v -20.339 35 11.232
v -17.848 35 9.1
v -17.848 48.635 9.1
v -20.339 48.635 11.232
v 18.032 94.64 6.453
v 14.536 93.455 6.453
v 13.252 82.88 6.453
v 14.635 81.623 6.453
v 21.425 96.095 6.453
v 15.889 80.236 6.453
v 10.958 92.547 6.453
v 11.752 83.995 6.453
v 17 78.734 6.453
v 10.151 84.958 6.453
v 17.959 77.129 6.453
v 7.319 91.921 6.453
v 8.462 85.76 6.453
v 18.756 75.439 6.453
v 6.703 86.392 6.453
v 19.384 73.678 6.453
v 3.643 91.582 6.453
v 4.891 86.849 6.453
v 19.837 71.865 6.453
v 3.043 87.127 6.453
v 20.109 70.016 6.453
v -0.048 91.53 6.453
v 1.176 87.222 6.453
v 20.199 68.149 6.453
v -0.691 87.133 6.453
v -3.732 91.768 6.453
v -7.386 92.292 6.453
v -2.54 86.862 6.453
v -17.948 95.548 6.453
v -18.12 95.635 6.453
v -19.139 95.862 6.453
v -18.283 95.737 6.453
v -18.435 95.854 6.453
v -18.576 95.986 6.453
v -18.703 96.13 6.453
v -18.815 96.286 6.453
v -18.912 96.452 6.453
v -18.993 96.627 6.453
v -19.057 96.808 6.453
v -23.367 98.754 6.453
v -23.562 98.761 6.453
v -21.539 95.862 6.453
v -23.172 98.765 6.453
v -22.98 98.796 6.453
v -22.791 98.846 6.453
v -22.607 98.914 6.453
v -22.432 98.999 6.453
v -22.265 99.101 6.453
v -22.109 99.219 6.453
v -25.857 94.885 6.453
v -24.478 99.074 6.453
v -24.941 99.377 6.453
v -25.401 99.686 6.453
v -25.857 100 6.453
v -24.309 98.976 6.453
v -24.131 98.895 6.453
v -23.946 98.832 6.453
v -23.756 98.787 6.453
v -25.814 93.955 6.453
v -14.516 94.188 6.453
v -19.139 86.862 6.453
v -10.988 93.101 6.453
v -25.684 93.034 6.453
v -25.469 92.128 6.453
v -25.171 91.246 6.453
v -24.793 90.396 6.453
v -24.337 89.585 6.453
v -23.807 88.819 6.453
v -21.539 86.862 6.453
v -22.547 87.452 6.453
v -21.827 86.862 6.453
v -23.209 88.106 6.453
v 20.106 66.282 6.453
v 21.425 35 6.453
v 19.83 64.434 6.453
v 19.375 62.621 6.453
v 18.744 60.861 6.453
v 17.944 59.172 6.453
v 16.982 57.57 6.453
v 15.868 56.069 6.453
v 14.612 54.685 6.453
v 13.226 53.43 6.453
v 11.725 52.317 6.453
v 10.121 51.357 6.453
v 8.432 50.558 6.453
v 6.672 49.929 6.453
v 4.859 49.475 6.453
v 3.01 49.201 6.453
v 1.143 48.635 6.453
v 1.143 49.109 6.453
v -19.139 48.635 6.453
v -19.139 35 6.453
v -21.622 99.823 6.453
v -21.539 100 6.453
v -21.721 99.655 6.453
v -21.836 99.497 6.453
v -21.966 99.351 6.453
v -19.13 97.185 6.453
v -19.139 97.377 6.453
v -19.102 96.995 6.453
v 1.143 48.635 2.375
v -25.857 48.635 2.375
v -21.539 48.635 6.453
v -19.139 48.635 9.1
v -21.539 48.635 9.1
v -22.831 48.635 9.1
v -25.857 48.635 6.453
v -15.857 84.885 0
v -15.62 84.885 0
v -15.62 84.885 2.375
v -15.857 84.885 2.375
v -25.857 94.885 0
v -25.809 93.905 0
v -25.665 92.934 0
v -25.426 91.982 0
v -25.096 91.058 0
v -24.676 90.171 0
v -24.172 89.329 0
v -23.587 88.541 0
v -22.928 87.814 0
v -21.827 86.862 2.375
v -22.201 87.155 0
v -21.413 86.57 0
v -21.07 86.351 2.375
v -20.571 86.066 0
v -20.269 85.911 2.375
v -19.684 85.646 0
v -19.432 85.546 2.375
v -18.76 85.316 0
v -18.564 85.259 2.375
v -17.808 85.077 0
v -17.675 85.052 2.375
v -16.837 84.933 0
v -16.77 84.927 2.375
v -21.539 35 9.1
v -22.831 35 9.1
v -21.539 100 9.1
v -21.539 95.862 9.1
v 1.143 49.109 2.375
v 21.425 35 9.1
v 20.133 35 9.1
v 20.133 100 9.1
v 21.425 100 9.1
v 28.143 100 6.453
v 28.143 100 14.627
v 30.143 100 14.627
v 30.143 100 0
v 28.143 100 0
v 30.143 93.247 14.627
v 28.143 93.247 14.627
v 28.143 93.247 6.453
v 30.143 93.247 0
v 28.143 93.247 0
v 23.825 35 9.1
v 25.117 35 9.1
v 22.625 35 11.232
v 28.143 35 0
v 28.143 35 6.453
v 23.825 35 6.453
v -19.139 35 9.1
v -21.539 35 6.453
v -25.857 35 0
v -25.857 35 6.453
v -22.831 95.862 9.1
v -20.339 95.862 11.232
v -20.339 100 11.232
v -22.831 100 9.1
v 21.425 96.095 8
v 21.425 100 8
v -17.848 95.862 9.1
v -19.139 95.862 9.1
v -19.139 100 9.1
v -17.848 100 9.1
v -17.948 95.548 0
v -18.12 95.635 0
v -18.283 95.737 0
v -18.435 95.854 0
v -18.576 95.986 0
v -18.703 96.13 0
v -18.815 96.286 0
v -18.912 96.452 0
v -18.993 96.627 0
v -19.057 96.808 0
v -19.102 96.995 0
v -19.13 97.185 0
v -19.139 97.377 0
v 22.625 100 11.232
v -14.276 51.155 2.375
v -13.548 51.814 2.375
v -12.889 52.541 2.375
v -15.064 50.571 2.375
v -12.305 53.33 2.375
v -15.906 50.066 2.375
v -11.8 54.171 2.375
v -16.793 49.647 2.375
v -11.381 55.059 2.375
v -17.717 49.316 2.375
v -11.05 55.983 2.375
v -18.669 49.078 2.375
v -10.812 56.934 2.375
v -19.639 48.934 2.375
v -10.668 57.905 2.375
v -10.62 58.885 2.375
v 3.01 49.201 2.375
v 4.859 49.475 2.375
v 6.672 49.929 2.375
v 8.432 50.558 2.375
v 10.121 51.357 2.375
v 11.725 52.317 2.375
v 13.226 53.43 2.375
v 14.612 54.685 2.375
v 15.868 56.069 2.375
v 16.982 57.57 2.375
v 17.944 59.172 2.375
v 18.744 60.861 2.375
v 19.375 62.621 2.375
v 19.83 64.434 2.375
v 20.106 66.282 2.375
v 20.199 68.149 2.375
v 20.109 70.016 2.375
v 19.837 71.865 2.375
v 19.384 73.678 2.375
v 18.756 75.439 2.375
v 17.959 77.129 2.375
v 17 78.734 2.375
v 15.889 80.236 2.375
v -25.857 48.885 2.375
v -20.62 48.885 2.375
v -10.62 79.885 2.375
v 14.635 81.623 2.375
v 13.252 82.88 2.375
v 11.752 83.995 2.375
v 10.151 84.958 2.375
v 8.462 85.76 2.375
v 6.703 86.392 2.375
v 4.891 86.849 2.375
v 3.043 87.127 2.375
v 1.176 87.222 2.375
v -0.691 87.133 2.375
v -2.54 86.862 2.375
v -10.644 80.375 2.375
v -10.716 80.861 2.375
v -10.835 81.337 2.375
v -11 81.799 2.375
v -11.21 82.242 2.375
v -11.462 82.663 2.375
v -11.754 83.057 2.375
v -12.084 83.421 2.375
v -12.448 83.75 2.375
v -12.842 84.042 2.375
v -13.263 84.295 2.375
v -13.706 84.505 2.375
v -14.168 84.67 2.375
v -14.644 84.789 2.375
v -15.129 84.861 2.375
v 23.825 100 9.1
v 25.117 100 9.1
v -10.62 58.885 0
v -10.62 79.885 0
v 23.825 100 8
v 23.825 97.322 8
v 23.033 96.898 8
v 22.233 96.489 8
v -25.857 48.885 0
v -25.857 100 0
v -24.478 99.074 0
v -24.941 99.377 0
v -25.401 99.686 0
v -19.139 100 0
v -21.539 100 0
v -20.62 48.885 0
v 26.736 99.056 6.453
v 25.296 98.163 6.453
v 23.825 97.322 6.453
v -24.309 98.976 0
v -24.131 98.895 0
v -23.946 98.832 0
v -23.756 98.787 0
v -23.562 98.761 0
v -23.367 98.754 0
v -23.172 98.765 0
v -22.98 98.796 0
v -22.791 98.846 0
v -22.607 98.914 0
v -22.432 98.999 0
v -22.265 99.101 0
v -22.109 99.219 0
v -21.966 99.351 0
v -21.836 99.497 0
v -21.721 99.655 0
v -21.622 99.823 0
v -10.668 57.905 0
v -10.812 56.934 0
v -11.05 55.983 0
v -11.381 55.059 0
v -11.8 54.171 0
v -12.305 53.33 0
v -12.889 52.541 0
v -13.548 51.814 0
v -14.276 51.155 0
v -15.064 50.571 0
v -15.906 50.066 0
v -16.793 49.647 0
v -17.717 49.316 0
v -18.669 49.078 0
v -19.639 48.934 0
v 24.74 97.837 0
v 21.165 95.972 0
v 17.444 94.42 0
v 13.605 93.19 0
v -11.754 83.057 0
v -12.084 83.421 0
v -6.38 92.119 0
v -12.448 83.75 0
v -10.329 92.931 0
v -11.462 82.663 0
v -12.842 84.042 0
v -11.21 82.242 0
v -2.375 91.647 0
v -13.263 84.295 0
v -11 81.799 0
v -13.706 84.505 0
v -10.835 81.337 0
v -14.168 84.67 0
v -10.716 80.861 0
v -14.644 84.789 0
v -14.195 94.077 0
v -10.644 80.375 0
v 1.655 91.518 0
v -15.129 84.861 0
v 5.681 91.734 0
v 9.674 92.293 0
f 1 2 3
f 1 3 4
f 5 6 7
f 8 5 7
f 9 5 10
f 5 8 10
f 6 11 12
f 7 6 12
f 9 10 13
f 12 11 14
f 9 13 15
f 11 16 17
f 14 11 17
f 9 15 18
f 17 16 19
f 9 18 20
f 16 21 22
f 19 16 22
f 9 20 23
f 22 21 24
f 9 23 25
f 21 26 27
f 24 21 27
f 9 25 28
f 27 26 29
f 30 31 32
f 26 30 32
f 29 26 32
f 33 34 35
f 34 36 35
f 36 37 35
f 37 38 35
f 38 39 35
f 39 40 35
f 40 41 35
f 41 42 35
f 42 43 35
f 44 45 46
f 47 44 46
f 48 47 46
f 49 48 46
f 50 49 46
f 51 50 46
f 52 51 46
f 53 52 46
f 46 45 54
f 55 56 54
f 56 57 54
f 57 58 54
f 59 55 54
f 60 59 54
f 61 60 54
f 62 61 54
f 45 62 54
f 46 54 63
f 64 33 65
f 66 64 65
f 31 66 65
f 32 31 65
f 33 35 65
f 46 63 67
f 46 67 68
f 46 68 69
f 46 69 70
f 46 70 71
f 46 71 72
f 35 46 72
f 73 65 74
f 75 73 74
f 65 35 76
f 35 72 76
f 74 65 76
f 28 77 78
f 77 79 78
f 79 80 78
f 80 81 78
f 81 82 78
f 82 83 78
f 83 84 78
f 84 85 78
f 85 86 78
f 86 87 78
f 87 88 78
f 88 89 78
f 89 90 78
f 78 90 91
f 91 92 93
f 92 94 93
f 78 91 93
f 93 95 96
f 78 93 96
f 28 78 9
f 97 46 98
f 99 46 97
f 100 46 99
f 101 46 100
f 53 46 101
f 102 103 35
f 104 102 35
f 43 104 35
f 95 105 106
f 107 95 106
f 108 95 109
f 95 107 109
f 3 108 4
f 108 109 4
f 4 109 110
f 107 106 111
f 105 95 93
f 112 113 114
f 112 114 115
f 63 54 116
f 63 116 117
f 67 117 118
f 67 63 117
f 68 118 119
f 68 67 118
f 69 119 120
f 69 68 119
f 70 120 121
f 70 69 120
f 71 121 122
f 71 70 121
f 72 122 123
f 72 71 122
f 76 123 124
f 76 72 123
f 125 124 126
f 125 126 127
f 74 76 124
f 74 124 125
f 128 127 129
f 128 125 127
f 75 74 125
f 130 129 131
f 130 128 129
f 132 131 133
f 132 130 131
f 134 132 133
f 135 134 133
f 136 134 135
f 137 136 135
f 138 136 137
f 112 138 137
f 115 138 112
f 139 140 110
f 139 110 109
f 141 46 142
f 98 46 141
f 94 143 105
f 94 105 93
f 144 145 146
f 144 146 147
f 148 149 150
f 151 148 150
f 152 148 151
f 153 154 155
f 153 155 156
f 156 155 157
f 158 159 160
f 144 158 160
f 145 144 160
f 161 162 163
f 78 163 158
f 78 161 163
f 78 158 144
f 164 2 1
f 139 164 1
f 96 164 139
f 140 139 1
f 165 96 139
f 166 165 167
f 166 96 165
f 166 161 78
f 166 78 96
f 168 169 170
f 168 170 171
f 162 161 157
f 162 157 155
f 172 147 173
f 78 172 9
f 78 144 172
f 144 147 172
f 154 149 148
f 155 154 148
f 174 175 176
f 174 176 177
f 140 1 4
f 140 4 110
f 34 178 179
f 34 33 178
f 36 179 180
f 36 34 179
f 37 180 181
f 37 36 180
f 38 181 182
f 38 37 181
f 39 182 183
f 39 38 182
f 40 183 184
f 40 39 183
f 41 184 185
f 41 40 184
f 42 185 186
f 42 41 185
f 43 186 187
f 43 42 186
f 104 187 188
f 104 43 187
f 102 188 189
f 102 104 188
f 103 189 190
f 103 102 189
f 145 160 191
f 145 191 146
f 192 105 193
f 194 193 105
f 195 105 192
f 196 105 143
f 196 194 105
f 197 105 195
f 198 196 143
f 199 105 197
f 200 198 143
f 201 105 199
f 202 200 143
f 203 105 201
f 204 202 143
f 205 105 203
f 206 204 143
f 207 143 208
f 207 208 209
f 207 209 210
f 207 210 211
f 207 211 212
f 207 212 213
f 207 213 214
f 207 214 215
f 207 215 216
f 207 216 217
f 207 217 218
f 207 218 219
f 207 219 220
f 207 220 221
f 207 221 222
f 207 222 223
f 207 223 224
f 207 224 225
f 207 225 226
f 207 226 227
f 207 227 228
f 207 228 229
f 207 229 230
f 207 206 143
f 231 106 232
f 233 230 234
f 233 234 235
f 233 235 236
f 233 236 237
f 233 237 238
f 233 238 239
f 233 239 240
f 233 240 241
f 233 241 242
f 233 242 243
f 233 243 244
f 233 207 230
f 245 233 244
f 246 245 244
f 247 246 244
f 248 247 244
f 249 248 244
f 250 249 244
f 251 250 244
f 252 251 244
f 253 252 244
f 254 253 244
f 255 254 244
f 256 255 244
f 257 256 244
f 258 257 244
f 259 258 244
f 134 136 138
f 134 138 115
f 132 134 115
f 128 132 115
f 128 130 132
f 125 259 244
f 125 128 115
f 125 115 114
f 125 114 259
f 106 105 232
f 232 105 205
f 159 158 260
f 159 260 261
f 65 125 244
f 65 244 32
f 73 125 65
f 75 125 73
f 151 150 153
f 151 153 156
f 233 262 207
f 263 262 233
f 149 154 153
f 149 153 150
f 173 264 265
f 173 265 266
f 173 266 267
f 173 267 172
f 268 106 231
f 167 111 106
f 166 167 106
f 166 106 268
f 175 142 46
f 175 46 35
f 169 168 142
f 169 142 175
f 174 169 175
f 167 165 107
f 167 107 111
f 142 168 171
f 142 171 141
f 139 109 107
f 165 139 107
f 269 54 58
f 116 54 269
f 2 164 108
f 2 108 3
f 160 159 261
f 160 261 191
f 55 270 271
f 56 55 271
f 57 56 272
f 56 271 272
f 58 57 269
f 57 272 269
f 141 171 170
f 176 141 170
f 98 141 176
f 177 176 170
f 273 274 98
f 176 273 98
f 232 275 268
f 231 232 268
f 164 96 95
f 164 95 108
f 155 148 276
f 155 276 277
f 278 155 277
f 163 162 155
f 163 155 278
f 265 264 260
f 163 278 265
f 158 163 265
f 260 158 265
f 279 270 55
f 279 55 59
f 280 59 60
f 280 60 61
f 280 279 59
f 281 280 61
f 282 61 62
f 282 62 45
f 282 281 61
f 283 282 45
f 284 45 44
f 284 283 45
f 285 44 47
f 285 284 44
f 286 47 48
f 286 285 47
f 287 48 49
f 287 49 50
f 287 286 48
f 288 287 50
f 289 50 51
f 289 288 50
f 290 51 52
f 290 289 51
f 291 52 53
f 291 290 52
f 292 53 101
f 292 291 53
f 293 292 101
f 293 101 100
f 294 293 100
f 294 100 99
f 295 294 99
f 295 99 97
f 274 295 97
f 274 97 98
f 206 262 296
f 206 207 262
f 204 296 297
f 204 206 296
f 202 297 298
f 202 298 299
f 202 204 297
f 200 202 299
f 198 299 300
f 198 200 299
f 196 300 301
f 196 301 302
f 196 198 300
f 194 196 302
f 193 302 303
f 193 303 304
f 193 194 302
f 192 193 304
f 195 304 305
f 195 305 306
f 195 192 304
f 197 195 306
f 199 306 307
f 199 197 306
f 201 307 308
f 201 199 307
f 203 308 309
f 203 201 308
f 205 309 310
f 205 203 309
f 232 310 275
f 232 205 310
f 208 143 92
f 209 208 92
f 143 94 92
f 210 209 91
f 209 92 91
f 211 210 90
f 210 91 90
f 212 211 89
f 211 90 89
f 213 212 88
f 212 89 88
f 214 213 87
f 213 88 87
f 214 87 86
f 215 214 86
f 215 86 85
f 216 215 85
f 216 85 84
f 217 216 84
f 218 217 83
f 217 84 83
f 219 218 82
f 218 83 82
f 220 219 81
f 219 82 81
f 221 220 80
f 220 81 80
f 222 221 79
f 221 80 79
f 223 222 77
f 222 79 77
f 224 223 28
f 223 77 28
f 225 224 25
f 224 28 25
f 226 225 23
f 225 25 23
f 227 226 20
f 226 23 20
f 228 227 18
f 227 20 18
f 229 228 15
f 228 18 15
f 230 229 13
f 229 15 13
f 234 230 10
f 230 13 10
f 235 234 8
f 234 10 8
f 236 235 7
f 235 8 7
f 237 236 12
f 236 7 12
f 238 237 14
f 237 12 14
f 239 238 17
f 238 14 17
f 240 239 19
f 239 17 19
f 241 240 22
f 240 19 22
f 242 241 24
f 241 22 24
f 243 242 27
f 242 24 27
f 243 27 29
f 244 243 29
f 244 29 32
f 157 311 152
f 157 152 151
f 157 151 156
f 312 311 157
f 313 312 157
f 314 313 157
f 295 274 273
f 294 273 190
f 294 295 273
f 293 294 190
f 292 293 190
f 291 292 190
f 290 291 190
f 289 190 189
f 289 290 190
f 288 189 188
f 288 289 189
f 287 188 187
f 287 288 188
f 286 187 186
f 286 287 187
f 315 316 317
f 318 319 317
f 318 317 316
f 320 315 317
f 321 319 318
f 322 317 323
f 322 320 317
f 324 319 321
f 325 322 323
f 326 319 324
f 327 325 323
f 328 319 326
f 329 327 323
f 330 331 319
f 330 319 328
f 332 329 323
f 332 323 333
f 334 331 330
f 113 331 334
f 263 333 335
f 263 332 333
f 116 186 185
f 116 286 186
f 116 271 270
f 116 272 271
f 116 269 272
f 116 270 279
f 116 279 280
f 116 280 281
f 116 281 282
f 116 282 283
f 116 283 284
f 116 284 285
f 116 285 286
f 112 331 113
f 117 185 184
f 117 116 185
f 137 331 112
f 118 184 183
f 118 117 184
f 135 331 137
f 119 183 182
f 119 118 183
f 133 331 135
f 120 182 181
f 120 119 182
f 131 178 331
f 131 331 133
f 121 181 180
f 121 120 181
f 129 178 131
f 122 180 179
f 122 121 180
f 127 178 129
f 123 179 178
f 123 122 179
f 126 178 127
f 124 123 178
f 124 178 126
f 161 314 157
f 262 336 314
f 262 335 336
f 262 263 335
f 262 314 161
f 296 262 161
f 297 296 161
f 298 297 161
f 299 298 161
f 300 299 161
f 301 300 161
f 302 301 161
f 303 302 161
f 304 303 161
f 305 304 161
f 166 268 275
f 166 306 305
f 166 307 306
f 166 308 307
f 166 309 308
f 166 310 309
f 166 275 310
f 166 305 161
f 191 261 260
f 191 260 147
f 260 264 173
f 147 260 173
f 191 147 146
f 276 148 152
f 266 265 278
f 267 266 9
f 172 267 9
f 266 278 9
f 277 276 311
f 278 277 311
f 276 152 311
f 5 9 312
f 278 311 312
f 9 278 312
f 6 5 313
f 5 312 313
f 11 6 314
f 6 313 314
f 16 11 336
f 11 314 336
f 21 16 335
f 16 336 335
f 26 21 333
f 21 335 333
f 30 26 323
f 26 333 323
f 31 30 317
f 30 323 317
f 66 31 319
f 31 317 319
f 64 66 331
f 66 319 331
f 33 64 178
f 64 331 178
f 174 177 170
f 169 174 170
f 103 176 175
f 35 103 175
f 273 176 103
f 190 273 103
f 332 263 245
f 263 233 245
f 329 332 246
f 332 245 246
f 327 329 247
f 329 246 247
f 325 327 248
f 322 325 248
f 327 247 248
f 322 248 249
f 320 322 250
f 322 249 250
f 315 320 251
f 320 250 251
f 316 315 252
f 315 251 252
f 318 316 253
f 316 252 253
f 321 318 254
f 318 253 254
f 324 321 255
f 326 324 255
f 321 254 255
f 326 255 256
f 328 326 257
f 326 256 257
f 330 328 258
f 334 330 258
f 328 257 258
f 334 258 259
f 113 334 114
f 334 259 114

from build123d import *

# Parameters (mm, degrees)
SALIENTE_EXTRUIR1_DEPTH = 100
SKETCH3_W               = 10.723679857
SKETCH3_H               = 38.227553418
CUT_EXTRUDE1_DEPTH      = 27
SKETCH5_R               = 19.056213919
CUT_EXTRUDE2_DEPTH      = 4.078011603
CUT_EXTRUDE3_DEPTH      = 8
SKETCH7_W               = 15.237542525
SKETCH7_H               = 35.999775061
CUT_EXTRUDE4_DEPTH      = 5.8
FILLET1_R               = 10
FILLET2_R               = 10
FILLET3_R               = 5
SKETCH8_W               = 14.627019037
SKETCH8_H               = 6.752783555
BOSS_EXTRUDE1_DEPTH     = 2
SKETCH11_W              = 54
SKETCH11_H              = 35
CUT_EXTRUDE6_DEPTH      = 19
SKETCH12_W              = 5.502183779
SKETCH12_H              = 5.157792635
CUT_EXTRUDE7_DEPTH      = 9
BOSS_EXTRUDE2_START     = 8
BOSS_EXTRUDE2_DEPTH     = 8
FILLET4_R               = 2
FILLET5_R               = 2


with BuildPart() as part:
    # Croquis1 → Saliente-Extruir1 (new body)
    with BuildSketch(Plane(origin=(0, 0, 0), x_dir=(1, 0, 0), z_dir=(0, 1, 0))):
        Polygon((-22.831092882, -9.100137773), (-21.539334245, -9.100137773), (-21.539334245, -6.453403554), (-25.857066178, -6.453403554), (-25.857066178, 0), (28.142933822, 0), (28.142933822, -6.453403554), (23.825201889, -6.453403554), (23.825201889, -9.100137773), (25.116960526, -9.100137773), (22.625201889, -11.232188763), (20.133443253, -9.100137773), (21.425201889, -9.100137773), (21.425201889, -6.453403554), (-19.139334245, -6.453403554), (-19.139334245, -9.100137773), (-17.847575609, -9.100137773), (-20.339334245, -11.232188763), align=None)
    extrude(amount=SALIENTE_EXTRUIR1_DEPTH)

    # Sketch3 → Cut-Extrude1 (cut)
    with BuildSketch(Plane.ZY.offset(25.857066178)):
        with Locations((7.73723188, 67.748563888)):
            Rectangle(SKETCH3_W, SKETCH3_H)
    extrude(amount=-CUT_EXTRUDE1_DEPTH, mode=Mode.SUBTRACT)

    # Sketch5 → Cut-Extrude2 (cut)
    with BuildSketch(Plane.XY.offset(6.453403554)):
        with Locations((1.142933822, 68.165450094)):
            Circle(SKETCH5_R)
    extrude(amount=-CUT_EXTRUDE2_DEPTH, mode=Mode.SUBTRACT)

    # Sketch6 → Cut-Extrude3 (cut)
    with BuildSketch(Plane(origin=(0, 0, 0), x_dir=(-1, 0, 0), z_dir=(0, 0, -1))):
        with BuildLine():
            ThreePointArc((-28.142933822, 100), (-1.142933822, 91.515299145), (25.857066178, 100))
            ThreePointArc((25.857066178, 100), (-1.142933822, 109.141720496), (-28.142933822, 100))
        make_face()
    extrude(amount=-CUT_EXTRUDE3_DEPTH, mode=Mode.SUBTRACT)

    # Sketch7 → Cut-Extrude4 (cut)
    with BuildSketch(Plane(origin=(0, 0, 0), x_dir=(-1, 0, 0), z_dir=(0, 0, -1))):
        with Locations((18.238294915, 66.88524583)):
            Rectangle(SKETCH7_W, SKETCH7_H)
    extrude(amount=-CUT_EXTRUDE4_DEPTH, mode=Mode.SUBTRACT)

    # Fillet1
    fillet1_edges = [part.edges().sort_by_distance(p)[0] for p in [
        (-25.857066178, 84.885133361, 1.187695976),
    ]]
    fillet(fillet1_edges, radius=FILLET1_R)

    # Fillet2
    fillet2_edges = [part.edges().sort_by_distance(p)[0] for p in [
        (-10.619523653, 48.8853583, 1.187695976),
    ]]
    fillet(fillet2_edges, radius=FILLET2_R)

    # Fillet3
    fillet3_edges = [part.edges().sort_by_distance(p)[0] for p in [
        (-10.619523653, 84.885133361, 1.187695976),
    ]]
    fillet(fillet3_edges, radius=FILLET3_R)

    # Sketch8 → Boss-Extrude1 (add)
    with BuildSketch(Plane(origin=(28.142933822, 0, 0), x_dir=(0, 0, -1), z_dir=(1, 0, 0))):
        with Locations((-7.313509519, 96.623608222)):
            Rectangle(SKETCH8_W, SKETCH8_H)
    extrude(amount=BOSS_EXTRUDE1_DEPTH)

    # Sketch11 → Cut-Extrude6 (cut)
    with BuildSketch(Plane(origin=(0, 0, 0), x_dir=(-1, 0, 0), z_dir=(0, 0, -1))):
        with Locations((-1.142933822, 17.5)):
            Rectangle(SKETCH11_W, SKETCH11_H)
    extrude(amount=-CUT_EXTRUDE6_DEPTH, mode=Mode.SUBTRACT)

    # Sketch12 → Cut-Extrude7 (cut)
    with BuildSketch(Plane.XZ.offset(-86.862340597)):
        with Locations((-20.48547756, 9.032299872)):
            Rectangle(SKETCH12_W, SKETCH12_H)
    extrude(amount=-CUT_EXTRUDE7_DEPTH, mode=Mode.SUBTRACT)

    # Sketch13 → Boss-Extrude2 (add)
    with BuildSketch(Plane(origin=(0, 0, 8), x_dir=(-1, 0, 0), z_dir=(0, 0, -1)).offset(BOSS_EXTRUDE2_START)):
        with BuildLine():
            Line((21.539334245, 100), (19.139334245, 100))
            Line((19.139334245, 100), (19.139334245, 96.095020365))
            ThreePointArc((19.139334245, 96.095020365), (20.348097119, 96.6915372), (21.539334245, 97.322325698))
            Line((21.539334245, 97.322325698), (21.539334245, 100))
        make_face()
    extrude(amount=-BOSS_EXTRUDE2_DEPTH)

    # Fillet4
    # the kernel refuses this fillet: 2 mm, written as the material it adds along each edge
    with BuildSketch(Plane(origin=(-21.539334245, 97.322325698, 0), x_dir=(0, 1, 0), z_dir=(0, 0, 1))) as fillet4_piece_1:
        with BuildLine():
            CenterArc((3.431070837, 1.852672033), FILLET4_R, 147.126635273, 100.744049636)
            Line((1.751326275, 2.938240182), (1.717731384, 2.959951545))
            ThreePointArc((1.717731384, 2.959951545), (0.814679242, 1.505469297), (-0.035079002, 0.019221436))
            Line((-0.035079002, 0.019221436), (0, -0.04))
            ThreePointArc((0, -0.04), (1.338837151, -0.04), (2.662606371, -0.037053441))
            Line((2.662606371, -0.037053441), (2.677674302, 0))
        make_face()
    extrude(amount=6.453403554)

    # Fillet5
    fillet5_edges = [part.edges().sort_by_distance(p)[0] for p in [
        (-19.139334245, 96.095020365, 3.226701777),
    ]]
    fillet(fillet5_edges, radius=FILLET5_R)


solid = part.part
